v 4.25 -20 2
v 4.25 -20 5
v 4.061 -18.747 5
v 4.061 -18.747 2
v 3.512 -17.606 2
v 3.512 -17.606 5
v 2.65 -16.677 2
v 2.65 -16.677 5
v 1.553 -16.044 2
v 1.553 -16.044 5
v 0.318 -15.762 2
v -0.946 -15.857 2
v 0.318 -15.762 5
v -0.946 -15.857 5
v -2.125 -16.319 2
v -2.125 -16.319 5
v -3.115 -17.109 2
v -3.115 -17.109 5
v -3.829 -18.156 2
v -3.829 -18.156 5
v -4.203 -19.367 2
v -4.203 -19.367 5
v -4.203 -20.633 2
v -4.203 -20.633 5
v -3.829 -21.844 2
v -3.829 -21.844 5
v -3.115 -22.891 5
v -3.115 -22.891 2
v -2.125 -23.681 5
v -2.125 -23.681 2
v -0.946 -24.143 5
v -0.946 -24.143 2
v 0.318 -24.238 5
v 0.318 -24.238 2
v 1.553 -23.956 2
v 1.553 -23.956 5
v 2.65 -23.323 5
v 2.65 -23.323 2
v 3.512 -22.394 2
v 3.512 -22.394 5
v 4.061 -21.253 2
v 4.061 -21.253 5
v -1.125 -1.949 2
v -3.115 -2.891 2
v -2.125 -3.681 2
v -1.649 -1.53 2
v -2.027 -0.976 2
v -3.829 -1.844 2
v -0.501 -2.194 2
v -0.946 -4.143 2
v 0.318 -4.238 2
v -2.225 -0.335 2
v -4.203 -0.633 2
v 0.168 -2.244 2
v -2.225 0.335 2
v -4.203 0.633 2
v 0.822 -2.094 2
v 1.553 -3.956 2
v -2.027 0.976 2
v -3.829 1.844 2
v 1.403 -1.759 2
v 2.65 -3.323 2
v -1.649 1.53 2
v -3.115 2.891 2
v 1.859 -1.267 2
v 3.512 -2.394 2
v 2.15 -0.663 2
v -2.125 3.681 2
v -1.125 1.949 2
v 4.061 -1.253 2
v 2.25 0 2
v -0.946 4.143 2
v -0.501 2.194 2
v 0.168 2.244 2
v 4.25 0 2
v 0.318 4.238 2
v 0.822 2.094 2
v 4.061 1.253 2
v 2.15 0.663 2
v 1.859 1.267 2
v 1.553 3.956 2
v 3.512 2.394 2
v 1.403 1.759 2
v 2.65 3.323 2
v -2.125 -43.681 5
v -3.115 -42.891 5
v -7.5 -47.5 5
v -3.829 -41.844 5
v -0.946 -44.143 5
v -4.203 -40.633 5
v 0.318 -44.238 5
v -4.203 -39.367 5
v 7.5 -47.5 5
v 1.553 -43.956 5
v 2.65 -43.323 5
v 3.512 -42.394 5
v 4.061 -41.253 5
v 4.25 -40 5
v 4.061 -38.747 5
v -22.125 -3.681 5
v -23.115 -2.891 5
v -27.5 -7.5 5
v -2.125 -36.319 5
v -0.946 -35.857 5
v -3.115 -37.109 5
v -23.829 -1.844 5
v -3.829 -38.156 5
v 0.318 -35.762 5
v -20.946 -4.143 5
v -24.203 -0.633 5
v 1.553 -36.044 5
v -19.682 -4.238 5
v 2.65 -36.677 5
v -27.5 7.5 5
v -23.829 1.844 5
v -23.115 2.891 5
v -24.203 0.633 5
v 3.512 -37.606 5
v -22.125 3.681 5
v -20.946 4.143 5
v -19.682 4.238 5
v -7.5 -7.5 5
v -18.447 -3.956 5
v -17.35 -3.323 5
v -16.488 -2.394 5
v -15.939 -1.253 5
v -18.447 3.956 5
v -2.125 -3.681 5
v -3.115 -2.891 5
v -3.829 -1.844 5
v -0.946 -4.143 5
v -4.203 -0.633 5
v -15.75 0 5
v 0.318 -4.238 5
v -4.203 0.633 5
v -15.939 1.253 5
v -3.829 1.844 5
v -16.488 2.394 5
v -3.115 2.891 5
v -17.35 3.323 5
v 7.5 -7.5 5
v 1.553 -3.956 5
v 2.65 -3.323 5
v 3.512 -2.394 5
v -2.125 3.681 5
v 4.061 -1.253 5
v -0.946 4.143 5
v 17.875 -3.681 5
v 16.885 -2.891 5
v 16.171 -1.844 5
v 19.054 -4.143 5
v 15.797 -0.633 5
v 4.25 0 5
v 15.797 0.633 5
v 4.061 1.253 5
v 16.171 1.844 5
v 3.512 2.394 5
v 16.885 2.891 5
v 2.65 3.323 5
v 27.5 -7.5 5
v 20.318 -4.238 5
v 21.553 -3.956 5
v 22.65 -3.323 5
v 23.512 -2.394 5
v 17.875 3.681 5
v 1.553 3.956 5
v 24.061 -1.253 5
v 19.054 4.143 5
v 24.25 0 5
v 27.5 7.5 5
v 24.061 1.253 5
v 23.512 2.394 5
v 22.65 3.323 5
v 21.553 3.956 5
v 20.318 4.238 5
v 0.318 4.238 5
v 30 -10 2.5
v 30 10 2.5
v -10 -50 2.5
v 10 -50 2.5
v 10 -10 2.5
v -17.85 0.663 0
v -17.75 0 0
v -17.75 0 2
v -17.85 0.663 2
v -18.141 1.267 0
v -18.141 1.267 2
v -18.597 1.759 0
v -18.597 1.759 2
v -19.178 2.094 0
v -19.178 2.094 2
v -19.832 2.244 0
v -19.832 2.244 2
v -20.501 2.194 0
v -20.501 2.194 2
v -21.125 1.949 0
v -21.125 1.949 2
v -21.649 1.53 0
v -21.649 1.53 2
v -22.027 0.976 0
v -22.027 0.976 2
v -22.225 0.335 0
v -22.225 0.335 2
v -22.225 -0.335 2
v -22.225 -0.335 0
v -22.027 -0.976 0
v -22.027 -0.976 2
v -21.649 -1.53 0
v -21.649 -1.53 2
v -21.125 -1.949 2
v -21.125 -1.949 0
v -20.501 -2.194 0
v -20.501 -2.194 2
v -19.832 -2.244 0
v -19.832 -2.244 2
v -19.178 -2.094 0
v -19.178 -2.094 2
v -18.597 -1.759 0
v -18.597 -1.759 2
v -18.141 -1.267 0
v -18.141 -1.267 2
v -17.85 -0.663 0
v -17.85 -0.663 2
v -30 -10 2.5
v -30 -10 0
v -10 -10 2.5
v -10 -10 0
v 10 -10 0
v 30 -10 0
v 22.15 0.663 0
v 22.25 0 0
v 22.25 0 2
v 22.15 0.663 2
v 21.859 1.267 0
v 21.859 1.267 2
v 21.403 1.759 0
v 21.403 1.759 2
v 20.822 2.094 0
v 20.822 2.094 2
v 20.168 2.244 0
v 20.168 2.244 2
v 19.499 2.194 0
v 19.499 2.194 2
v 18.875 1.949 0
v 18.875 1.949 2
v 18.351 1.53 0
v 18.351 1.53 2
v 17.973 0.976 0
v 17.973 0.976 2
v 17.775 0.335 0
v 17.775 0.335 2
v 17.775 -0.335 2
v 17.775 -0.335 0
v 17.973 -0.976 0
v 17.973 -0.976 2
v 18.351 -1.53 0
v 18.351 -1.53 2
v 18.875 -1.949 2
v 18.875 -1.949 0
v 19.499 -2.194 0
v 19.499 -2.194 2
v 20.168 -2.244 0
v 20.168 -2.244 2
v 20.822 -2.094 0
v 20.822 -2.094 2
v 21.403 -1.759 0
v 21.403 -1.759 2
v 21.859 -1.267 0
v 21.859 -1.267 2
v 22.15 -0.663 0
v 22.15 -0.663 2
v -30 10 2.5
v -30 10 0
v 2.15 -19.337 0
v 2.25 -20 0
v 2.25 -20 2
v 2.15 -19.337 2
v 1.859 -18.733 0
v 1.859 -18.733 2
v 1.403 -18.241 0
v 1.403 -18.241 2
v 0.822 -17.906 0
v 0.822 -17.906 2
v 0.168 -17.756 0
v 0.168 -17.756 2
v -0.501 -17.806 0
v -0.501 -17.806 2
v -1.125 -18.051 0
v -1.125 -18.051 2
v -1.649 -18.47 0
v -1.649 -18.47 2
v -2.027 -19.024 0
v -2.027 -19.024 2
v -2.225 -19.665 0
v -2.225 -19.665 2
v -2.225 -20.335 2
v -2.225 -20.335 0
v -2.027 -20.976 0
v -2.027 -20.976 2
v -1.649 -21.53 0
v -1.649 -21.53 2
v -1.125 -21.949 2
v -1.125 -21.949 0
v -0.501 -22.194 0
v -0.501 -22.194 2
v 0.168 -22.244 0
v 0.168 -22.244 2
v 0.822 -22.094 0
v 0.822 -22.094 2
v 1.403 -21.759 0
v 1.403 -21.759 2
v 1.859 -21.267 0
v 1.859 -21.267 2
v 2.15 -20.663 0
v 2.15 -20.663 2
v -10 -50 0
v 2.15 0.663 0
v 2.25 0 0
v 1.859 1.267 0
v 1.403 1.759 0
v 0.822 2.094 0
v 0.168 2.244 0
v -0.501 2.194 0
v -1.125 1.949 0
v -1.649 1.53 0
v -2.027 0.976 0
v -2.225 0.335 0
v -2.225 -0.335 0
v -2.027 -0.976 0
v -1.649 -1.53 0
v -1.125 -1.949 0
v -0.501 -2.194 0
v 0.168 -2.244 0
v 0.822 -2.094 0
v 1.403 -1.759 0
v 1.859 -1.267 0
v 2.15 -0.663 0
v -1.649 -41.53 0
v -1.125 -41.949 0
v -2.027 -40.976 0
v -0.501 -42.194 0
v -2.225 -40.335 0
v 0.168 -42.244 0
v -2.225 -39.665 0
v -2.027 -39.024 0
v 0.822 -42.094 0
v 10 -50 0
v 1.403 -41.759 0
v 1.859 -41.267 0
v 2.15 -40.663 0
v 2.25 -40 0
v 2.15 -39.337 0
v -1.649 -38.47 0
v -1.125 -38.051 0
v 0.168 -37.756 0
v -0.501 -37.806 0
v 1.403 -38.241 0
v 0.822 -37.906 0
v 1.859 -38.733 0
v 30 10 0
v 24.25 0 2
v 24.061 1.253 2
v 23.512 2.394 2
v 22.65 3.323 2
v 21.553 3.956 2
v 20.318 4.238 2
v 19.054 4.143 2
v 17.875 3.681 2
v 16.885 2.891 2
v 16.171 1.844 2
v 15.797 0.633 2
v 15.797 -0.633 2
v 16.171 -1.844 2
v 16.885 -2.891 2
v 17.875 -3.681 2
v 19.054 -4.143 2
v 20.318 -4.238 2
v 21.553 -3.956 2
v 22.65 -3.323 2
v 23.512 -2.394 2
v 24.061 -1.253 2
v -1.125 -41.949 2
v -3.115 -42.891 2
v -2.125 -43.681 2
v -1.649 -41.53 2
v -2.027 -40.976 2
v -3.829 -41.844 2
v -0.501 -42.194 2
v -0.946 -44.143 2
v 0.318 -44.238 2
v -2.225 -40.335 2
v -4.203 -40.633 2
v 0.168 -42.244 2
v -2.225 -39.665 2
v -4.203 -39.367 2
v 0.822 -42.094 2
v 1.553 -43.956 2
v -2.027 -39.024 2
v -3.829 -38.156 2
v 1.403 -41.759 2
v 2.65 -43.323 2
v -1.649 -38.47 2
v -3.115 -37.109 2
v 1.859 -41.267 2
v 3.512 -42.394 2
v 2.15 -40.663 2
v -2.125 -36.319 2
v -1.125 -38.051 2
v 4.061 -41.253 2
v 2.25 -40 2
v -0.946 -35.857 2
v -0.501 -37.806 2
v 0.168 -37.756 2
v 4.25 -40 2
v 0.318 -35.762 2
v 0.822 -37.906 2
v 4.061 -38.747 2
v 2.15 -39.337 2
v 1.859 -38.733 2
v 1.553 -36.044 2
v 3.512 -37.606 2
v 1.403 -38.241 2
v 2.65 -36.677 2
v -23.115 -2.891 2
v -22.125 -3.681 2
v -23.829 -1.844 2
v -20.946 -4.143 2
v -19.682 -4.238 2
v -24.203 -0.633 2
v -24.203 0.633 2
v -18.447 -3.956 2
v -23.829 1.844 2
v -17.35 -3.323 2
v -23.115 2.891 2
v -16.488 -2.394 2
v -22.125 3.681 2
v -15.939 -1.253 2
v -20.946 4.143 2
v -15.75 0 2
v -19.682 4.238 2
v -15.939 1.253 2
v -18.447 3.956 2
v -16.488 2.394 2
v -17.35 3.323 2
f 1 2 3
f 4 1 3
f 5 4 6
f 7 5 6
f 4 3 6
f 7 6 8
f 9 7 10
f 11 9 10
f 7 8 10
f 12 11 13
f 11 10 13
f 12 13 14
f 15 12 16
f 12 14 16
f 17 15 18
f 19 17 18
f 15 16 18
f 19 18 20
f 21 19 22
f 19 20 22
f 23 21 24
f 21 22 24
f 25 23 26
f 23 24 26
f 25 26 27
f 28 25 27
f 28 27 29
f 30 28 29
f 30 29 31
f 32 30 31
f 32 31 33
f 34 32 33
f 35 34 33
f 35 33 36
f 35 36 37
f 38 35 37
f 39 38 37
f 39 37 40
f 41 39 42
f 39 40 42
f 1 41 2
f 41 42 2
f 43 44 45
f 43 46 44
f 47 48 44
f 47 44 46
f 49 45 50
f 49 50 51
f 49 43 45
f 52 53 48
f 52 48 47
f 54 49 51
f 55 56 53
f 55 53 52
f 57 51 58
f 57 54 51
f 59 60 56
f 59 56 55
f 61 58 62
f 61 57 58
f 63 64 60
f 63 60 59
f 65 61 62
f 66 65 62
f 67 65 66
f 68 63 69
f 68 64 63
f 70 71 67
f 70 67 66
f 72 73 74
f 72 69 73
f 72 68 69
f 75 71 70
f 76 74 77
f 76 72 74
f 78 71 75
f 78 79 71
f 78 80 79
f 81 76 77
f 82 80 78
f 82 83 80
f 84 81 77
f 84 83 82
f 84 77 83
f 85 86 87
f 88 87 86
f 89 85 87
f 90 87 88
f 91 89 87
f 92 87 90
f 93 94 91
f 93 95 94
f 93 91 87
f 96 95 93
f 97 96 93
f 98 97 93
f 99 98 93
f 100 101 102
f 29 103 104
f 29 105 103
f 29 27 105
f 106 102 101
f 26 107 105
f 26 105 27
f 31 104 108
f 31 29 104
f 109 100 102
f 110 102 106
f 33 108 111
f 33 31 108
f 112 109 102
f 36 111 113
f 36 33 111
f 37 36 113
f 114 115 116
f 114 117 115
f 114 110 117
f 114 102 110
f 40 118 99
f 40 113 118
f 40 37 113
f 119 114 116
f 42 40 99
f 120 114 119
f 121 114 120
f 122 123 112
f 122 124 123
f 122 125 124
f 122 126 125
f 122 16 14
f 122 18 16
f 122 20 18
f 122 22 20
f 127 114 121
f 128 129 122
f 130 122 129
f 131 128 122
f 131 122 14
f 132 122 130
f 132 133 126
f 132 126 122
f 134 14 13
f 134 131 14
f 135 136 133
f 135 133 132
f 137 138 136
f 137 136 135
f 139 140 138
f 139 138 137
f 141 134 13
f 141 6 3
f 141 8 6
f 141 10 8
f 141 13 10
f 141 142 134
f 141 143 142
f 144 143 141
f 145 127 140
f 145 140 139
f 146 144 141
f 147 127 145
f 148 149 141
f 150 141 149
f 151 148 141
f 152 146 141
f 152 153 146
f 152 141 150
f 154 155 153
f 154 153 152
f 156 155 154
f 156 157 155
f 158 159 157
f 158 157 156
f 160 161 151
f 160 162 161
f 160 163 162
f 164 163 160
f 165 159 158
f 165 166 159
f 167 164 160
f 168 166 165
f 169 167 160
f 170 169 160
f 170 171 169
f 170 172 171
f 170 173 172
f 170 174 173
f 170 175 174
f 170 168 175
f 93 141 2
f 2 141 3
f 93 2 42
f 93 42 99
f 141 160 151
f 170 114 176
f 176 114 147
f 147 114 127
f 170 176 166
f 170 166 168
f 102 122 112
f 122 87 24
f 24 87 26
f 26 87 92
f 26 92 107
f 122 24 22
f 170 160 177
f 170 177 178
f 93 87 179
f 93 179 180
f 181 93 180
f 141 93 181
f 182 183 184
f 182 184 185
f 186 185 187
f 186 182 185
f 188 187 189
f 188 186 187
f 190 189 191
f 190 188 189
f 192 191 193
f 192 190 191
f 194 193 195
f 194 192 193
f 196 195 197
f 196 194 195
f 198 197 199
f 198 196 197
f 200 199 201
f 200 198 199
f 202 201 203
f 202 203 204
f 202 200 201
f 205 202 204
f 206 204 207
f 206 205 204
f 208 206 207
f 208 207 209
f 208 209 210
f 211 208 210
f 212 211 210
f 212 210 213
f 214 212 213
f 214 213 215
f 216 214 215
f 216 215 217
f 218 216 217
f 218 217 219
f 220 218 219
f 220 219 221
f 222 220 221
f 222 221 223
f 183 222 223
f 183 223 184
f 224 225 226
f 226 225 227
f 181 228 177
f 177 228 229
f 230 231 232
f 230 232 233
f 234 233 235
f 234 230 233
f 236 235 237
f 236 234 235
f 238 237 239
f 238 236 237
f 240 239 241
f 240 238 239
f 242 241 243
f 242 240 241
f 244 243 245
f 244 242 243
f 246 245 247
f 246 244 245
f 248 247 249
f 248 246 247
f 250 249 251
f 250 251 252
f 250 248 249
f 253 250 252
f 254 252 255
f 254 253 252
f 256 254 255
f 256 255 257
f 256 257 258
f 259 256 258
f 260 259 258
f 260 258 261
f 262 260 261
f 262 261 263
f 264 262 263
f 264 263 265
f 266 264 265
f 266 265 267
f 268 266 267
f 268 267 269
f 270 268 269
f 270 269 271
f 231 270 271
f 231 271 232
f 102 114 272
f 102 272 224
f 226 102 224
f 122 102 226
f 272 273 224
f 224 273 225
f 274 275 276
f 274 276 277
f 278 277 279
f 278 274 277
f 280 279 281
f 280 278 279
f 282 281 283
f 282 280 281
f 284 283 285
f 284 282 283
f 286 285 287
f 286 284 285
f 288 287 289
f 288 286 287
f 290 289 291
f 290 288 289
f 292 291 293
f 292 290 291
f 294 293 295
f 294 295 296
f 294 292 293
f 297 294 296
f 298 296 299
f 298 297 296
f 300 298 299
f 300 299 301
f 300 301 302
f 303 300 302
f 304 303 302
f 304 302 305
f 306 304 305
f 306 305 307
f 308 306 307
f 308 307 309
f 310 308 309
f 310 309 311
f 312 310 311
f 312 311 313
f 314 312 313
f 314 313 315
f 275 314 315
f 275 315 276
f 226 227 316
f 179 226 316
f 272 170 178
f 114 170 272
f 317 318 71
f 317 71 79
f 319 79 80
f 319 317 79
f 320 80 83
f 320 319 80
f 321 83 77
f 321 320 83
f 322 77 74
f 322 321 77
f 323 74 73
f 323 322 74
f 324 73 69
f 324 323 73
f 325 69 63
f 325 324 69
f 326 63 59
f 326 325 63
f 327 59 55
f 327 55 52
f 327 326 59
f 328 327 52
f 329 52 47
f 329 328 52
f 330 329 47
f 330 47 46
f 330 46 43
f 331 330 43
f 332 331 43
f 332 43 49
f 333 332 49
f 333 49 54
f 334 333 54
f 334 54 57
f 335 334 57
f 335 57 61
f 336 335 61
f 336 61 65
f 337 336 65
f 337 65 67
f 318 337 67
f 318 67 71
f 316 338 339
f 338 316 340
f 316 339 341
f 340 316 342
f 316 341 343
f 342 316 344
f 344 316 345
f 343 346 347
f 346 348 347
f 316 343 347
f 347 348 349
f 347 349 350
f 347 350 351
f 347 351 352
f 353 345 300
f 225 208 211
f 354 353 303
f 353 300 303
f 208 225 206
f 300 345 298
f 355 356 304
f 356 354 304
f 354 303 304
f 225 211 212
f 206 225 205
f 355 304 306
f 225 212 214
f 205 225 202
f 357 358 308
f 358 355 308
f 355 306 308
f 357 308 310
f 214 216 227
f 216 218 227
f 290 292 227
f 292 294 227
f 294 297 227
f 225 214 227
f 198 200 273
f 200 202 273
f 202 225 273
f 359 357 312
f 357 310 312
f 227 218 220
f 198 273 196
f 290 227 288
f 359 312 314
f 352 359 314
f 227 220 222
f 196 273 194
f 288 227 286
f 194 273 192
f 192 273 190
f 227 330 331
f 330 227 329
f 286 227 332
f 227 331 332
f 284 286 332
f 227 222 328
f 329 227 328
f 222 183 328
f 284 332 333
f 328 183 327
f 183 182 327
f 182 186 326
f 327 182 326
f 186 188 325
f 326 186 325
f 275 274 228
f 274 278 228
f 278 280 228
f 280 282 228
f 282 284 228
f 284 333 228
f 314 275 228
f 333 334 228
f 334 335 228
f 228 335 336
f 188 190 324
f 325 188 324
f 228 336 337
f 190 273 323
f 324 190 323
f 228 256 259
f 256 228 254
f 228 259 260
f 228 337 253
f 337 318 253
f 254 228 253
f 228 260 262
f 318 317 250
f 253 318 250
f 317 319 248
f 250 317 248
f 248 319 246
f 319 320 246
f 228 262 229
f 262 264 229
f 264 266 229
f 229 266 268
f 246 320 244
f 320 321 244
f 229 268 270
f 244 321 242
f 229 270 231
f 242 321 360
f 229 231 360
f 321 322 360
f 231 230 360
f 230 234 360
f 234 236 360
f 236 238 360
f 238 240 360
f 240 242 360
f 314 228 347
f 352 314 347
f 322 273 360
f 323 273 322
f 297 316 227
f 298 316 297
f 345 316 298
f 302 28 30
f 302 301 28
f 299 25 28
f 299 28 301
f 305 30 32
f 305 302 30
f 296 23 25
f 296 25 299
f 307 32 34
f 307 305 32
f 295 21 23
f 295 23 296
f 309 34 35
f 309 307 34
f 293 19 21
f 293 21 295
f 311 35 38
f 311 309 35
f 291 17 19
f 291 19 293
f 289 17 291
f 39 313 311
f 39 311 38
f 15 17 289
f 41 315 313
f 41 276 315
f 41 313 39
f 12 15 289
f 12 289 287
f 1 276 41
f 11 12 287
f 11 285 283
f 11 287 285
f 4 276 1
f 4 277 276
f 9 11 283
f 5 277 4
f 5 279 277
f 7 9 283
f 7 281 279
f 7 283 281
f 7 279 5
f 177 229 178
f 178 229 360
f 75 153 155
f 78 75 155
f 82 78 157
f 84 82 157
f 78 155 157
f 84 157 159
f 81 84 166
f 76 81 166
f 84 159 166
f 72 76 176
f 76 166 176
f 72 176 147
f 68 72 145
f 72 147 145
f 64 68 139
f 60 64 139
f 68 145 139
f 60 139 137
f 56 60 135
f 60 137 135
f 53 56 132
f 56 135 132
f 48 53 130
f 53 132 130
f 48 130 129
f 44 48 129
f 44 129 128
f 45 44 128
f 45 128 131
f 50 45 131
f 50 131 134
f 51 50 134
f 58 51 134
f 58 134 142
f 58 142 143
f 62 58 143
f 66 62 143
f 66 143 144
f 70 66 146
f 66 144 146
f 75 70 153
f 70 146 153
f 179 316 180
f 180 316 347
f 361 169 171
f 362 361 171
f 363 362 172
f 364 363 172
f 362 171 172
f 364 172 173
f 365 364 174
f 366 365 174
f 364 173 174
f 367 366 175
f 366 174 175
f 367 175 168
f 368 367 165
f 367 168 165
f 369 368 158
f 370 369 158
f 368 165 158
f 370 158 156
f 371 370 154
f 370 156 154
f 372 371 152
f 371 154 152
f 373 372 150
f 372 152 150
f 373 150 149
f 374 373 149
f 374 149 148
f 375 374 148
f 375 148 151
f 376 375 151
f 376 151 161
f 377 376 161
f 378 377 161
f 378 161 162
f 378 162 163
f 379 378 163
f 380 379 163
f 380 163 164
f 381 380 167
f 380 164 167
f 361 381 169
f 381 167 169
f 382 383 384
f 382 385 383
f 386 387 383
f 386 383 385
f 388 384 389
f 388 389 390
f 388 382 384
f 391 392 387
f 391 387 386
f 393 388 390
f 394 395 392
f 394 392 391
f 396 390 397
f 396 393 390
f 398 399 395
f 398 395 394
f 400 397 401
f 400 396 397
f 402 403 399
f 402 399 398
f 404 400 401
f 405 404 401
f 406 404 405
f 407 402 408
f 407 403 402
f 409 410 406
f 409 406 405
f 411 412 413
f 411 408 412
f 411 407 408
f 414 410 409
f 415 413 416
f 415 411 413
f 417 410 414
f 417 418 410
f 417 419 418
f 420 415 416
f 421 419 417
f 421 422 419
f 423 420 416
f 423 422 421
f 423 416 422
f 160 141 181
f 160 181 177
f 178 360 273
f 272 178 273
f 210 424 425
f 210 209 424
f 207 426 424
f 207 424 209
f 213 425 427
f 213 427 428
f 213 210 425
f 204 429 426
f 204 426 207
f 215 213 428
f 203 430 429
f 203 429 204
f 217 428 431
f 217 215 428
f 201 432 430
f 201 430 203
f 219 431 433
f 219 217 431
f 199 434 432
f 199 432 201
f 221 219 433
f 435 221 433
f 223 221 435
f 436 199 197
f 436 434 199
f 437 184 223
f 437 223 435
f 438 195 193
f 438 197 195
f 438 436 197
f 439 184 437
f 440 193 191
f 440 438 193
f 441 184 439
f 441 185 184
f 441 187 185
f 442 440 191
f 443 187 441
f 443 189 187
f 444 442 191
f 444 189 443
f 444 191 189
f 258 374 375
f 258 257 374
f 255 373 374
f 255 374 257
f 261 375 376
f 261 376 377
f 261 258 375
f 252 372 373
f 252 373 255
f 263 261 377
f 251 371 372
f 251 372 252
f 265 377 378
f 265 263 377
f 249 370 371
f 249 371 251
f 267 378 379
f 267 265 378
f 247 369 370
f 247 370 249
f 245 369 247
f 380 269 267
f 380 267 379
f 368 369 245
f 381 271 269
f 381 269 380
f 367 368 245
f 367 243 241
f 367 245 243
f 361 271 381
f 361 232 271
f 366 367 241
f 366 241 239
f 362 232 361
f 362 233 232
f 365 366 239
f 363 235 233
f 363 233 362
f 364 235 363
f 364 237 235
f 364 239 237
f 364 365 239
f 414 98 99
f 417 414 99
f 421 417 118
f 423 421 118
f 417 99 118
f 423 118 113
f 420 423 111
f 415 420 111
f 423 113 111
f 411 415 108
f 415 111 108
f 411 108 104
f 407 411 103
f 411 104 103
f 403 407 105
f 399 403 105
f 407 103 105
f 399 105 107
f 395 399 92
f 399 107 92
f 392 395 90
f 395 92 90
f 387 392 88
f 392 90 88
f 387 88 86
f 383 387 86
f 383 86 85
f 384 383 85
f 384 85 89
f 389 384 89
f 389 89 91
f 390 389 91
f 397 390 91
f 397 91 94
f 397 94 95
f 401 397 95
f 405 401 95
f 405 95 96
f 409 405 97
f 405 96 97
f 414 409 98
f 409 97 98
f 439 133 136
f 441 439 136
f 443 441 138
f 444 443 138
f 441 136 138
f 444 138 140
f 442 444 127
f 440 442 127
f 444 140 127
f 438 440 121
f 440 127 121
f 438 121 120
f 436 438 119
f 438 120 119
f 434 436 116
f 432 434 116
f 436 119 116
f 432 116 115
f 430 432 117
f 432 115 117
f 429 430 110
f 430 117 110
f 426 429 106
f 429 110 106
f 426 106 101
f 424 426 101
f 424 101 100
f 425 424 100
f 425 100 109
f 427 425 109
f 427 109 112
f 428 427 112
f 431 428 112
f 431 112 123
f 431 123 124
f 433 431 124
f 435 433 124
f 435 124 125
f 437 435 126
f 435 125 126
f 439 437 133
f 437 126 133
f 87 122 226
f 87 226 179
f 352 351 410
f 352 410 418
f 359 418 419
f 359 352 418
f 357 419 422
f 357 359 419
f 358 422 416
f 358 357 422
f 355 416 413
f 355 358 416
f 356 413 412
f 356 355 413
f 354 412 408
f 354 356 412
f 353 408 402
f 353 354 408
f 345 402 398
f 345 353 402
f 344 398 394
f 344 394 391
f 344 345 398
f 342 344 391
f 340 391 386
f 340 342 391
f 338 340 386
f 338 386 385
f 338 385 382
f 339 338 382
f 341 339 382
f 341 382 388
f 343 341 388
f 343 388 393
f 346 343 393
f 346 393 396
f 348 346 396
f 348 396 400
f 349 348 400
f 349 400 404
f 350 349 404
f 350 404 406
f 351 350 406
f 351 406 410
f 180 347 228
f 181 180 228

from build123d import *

# Parameters (mm, degrees)
F0_R     = 2.25
F1_DEPTH = 5
F2_SIZE  = 2.5
F3_R     = 4.25
F3_R_2   = 2.25
F4_DEPTH = 3


with BuildPart() as f1:
    # F0 (on Top) → F1 (new body)
    with BuildSketch(Plane.XY):
        Polygon((-10, -50), (0, -50), (10, -50), (10, -10), (30, -10), (30, 10), (0, 10), (-30, 10), (-30, -10), (-10, -10), align=None)
        with Locations((0, -40)):
            Circle(F0_R, mode=Mode.SUBTRACT)
        with Locations((-20, 0)):
            Circle(F0_R, mode=Mode.SUBTRACT)
        with Locations((0, -20)):
            Circle(F0_R, mode=Mode.SUBTRACT)
        Circle(F0_R, mode=Mode.SUBTRACT)
        with Locations((20, 0)):
            Circle(F0_R, mode=Mode.SUBTRACT)
    extrude(amount=F1_DEPTH)

    # F2
    f2_edges = [f1.edges().sort_by_distance(p)[0] for p in [
        (0, -50, 5),
        (10, -30, 5),
        (20, -10, 5),
        (30, 0, 5),
        (0, 10, 5),
        (-30, 0, 5),
        (-20, -10, 5),
        (-10, -30, 5),
    ]]
    chamfer(f2_edges, length=F2_SIZE)

    # F3 (on face) → F4 (cut)
    with BuildSketch(Plane.XY.offset(5)):
        with Locations((-20, 0)):
            Circle(F3_R)
        with Locations((-20, 0)):
            Circle(F3_R_2, mode=Mode.SUBTRACT)
        Circle(F3_R)
        Circle(F3_R_2, mode=Mode.SUBTRACT)
        with Locations((20, 0)):
            Circle(F3_R)
        with Locations((20, 0)):
            Circle(F3_R_2, mode=Mode.SUBTRACT)
        with Locations((0, -20)):
            Circle(F3_R)
        with Locations((0, -20)):
            Circle(F3_R_2, mode=Mode.SUBTRACT)
        with Locations((0, -40)):
            Circle(F3_R)
        with Locations((0, -40)):
            Circle(F3_R_2, mode=Mode.SUBTRACT)
    extrude(amount=-F4_DEPTH, mode=Mode.SUBTRACT)


solid = f1.part
